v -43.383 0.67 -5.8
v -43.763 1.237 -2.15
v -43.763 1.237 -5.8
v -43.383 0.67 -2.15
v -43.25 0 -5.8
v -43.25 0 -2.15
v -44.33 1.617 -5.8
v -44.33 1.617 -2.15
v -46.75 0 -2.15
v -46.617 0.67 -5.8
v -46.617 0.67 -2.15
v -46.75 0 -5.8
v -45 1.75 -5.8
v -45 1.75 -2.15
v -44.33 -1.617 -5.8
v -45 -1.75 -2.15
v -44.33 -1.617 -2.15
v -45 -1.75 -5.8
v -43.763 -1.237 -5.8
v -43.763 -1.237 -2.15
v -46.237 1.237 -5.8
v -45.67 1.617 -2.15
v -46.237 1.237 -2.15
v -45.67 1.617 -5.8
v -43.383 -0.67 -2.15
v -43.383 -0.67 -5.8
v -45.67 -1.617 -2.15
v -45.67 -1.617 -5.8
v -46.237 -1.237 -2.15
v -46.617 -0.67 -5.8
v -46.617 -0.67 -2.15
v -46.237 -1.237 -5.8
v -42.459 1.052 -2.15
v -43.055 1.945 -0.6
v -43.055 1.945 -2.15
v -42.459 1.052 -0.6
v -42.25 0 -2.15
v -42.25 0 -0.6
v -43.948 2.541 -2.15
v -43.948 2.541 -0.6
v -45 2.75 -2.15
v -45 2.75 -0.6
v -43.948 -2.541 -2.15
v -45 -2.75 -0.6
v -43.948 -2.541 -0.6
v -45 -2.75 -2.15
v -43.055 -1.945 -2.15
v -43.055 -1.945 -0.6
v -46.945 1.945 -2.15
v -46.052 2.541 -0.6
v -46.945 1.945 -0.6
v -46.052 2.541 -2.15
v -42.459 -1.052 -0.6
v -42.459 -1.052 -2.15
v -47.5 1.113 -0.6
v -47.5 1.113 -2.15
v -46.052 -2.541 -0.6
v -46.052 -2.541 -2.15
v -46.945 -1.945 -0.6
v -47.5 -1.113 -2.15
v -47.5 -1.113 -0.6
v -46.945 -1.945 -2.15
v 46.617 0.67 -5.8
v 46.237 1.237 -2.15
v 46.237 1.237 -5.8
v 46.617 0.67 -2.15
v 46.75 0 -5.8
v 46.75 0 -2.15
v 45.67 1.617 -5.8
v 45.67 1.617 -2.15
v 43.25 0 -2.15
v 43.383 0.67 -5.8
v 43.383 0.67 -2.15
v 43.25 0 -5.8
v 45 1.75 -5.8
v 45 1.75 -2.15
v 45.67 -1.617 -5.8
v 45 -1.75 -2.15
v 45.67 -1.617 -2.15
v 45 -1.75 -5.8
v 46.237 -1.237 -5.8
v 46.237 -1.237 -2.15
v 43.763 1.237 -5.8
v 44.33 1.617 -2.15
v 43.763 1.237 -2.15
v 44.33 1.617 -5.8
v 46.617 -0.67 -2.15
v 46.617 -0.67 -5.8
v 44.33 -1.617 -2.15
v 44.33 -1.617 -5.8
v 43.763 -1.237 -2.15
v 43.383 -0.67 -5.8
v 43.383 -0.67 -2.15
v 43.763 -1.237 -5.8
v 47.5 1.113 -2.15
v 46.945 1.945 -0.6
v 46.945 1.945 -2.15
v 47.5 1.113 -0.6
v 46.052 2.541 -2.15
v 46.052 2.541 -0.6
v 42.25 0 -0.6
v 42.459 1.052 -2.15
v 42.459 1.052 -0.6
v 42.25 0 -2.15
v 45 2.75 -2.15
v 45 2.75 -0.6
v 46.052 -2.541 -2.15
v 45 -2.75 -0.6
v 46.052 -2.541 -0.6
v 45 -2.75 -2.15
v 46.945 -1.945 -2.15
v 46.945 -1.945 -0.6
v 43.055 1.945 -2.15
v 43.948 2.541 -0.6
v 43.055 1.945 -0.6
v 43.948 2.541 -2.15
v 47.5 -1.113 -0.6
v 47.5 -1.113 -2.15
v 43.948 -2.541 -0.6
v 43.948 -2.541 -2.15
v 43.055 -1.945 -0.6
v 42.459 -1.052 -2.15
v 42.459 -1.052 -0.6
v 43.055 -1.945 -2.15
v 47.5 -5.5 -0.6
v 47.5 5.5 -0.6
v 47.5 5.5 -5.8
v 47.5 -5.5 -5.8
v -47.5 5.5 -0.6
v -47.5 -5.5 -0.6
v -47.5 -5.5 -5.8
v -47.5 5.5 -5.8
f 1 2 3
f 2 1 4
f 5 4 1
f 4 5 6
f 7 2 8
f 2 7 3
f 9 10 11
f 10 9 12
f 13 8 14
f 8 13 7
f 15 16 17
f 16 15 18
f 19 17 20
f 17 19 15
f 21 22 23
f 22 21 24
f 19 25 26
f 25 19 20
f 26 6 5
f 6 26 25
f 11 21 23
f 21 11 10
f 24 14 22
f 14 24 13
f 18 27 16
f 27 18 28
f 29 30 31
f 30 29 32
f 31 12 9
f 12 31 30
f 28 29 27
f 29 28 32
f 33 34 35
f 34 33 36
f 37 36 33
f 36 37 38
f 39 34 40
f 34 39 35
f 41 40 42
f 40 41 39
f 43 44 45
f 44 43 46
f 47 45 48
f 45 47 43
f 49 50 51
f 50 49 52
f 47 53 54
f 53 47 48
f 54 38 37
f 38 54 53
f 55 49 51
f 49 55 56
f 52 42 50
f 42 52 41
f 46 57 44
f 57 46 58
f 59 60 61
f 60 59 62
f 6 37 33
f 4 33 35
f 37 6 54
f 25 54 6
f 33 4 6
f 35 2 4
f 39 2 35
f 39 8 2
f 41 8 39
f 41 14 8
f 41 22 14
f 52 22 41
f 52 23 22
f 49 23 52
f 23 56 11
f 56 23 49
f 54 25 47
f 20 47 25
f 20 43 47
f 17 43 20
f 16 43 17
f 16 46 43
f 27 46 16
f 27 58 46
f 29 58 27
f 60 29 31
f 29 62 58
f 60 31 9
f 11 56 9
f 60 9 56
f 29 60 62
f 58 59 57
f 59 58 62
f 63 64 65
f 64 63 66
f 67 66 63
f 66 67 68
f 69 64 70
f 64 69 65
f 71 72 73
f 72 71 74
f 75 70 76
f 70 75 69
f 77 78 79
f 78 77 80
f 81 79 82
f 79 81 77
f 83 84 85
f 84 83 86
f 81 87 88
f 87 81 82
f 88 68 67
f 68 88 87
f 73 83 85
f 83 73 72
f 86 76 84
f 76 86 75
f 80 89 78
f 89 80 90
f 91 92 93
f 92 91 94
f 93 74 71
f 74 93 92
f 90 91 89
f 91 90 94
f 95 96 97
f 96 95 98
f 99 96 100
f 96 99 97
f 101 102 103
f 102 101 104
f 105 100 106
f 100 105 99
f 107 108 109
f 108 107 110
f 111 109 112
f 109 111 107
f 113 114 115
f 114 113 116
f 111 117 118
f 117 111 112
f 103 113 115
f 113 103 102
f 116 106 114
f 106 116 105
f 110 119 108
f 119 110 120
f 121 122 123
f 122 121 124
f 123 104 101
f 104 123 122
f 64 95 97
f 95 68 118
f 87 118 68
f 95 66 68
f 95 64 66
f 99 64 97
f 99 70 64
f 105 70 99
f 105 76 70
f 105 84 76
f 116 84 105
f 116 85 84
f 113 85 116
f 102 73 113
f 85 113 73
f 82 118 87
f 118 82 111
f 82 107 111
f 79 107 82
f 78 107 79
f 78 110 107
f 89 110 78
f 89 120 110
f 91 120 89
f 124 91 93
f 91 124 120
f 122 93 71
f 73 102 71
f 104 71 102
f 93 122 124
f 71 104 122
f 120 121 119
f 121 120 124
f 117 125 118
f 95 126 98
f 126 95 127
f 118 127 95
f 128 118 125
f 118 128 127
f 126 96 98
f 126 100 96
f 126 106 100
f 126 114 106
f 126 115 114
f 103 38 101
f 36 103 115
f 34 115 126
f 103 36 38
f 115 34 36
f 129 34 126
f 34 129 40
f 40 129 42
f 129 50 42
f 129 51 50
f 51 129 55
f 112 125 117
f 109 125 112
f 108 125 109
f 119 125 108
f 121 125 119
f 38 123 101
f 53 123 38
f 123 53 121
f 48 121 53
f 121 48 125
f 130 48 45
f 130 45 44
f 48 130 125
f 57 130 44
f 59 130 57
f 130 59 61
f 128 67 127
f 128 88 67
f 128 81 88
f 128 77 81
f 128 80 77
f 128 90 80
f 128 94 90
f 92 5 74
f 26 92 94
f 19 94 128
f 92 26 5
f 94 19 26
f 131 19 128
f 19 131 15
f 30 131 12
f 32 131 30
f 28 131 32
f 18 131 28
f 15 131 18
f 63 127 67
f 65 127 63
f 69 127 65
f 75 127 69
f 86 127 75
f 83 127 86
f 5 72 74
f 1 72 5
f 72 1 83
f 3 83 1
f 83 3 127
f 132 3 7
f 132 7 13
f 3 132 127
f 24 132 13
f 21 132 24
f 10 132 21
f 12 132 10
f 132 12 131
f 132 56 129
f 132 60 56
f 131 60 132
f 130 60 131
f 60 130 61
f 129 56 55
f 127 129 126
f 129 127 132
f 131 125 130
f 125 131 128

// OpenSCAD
// file: ../library/linurs_screw.scad
// Metric screws and nuts 
// urs@linurs.org 2015
// It is targeted for 3D printing applications. 
// To look realistic is not the goal (Example: Nuts do not have a hole)

include <linurs_screw_dim.scad>

// Changes
//2019-02-09 split in two files
//2017-05-19 bug fix hexbolt had wrong diameter
//2017-01-22 bug fix lentgh of hex scre is outer lenght as other screw types
//2017-01-06 added hex screw
//2015-10-12 added screw_cut
//2015-11-29 screw_fix parameter sunk added, and module hex_bolt

// Consistent parameters in this file
// d screw diameter M2_5, M3, ... (enumeration with screw_d)
// t millimeters added to diameters 
//   For the screw, head, nut = 0. 
//   For the piece where the screw, nut, ... passes through = 0.5 so it slides in well

// functions used multiple times to position nuts and heads
function headh_cyl(d)=screw_cyl[d][1];  // height of cyl screw head
function headh_cnt(d)=screw_cyl[d][1];  // height of cnt screw head
function headh(d,type=head_cyl)=(type==head_cyl ? headh_cyl(d) : (type==head_cnt ? headh_cnt(d) : 0 )); // height of screw head 

function nuth(d)=screw_hex[d][2];   // height of hex nut

// head of a cylinder screw
module screw_head_cyl(d=M3, t=0)
{
  screwhd=screw_cyl[d][0]+t; // diameter of cylinder screw head
  cylinder(d=screwhd,h=headh(d=d, type=head_cyl), center=true,$fn=16); // screw head
}

// head of a countersunk screw
module screw_head_cnt(d=M3, t=0)
{
  screwd=screw_d[d]+t; 
  screwhd=screw_cnt[d][0]+t; // diameter of cylinder screw head
  cylinder(d1=screwd,d2=screwhd,h=headh(d=d,type=head_cnt), center=true,$fn=16); // screw head
}

// head of a hex screw
module screw_head_hex(d=M3, t=0)
{
    translate([0,0,-nuth(d)/2])nut(d=d, t=t);
}

// head of all screws
module screw_head(d=M3, type=head_cyl, t=0)
{ 
  if(type==head_cnt){
    screw_head_cnt(d=d, t=t);
  } else {
    if(type==head_cyl){
      screw_head_cyl(d=d, t=t);
    } else {
       if(type==head_hex){
           screw_head_hex(d=d, t=t); 
       } 
    }    
  }
}

// hex bolt 
module hex_bolt(d=M3, h=10, t=0)
{
  nutd=screw_hex[d][1]+t; // outer diameter of hex bolt
  cylinder(r=nutd/2,h=h+t, center=true,$fn=6); // nut
}

// nut 
module nut(d=M3, t=0)
{
  hex_bolt(d=d, h=nuth(d), t=t);    
}

// screw 
// w outer width of the screw = screw length + head 
module screw(w=10, d=M3, type=head_cyl, t=0){
  screwd=screw_d[d]+t;       // screw diameter
  cylinder(d=screwd, h=w, center=true,$fn=16); // screw thread length
  translate([0,0,w/2-headh(d=d,type=type)/2])
  screw_head(d=d,type=type, t=t);
}

// screw fix
// w outer width of the screw = screw length + head 
// sink additional material below to remove 
// raise additional material above to remove
module screw_fix(w=10, d=M3, type=head_cyl, sink=0, raise=0, t=0){
  screw(w=w-sink*2, d=d, type=type, t=t);
  translate([0,0,-(w-sink*2)/2+nuth(d)/2])
    nut(d=d,t=t);
  translate([0,0,-(w-sink+raise)/2])hex_bolt(d=d,h=sink+raise,t=t);    
  if(type==head_cnt){  
    translate([0,0,(w-sink+raise)/2])
    cylinder(d=screw_cnt[d][0]+t,h=sink+raise,center=true,$fn=16);
  }else{ 
    translate([0,0,(w-sink+raise)/2])
    cylinder(d=screw_cyl[d][0]+t,h=sink+raise,center=true,$fn=16);
  }     
}
//screw_fix();
//translate([10,0,0])screw_fix(sink=2,type=head_cnt);
//translate([-10,0,0])screw_fix(raise=2,type=head_cnt);

// screw cut
// material to be extracted from object to slide in a counter sunk screw for fixation
// w height of the cut out
// i depth of the screw
module screw_cut(d=M3,w=20,i=10,t=0,fn=32){
    hsh=screw_cnt[d][1];
    ws=screw_cnt[d][0]+t;
    ds=screw_d[d]+t;
    
    translate([i/2,0,-(w-hsh)/2])
      cube([i,ws,hsh],center=true);
    
    translate([0,0,-(w-hsh)/2])
      cylinder(d=ws,h=hsh,center=true,$fn=32);
    
    translate([0,0,-(w-hsh)/2+hsh])
        cylinder(d2=ds, d1=ws, h=hsh,center=true,$fn=fn);
    
    cylinder(h=w, d=ds, center=true, $fn=fn);   
    
    translate([i/2,0,0]) 
        cube([i,ds,w],center=true);
    
    for(y=[-1,1]){
        translate([i/2,y*ds/2,-w/2+hsh])
            rotate([45,0,0])
            cube([i,sqrt(2)*(ws-ds)/2,sqrt(2)*(ws-ds)/2],center=true);
    }
}
//screw_cut();

// nut cut
// material to be extracted from object to slide in a nut for fixation
// w height of the cylinder
// i lenght of the inlet
module nut_cut(w=10, wi=0, d=M3, i=10, t=0, raise=0, type=head_cyl){ 
  nut(d,t);
  translate([i/2,0,0])
    cube([i,screw_hex[d][0]+t,nuth(d)+t],center=true);
  translate([0,0,-wi])
      if(type==head_cnt){    
          screw(w=w, d=d, type=type, t=t); 
        translate([0,0,(w+raise)/2-0.01])
          cylinder(d=screw_cnt[d][0]+t,h=raise,center=true,$fn=16);
      }else{ 
          screw(w=w, d=d, type=type, t=t);   
        translate([0,0,(w+raise)/2-0.01])
          cylinder(d=screw_cyl[d][0]+t,h=raise,center=true,$fn=16);
      }       
}
//
nut_cut(raise=2,type=head_cnt,i=14,w=20,wi=2, t=1);

// present the library
show=0;

if(show==1){
    grid=20;
    
    for (j=[0:10]){
        for (i=[0:3])
           translate([j*grid,i*grid,0]){  
           
    // elements           
           if(j==0){
             screw_fix(w=(i+2)*5,d=i, type=head_cyl, t=0);
           }
       
           if(j==1){
             nut(d=i,t=0);
           } 
       
           if(j==2){   
              screw(d=i,t=0);
           } 
           
           if(j==3){   
              screw(d=i,t=0,type=head_cnt);
           } 
           
           if(j==4){   
              screw(d=i,t=0,type=head_hex);
           } 
           
           if(j==5){   
              hex_bolt(d=i,t=0);
           } 
           
       }
    }   
     
    for (j=[0:2]){
        for (i=[0:3])
           translate([j*grid,-(i+1)*grid,0]){  
             difference(){
                cube([3*screw_d[i],3*screw_d[i],(i+2)*5-0.1],center=true);    
    
                if(j==0){
                  screw_fix(w=(i+2)*5,d=i,type=head_cnt, t=0.5);
                }   
                
                if(j==1){
                  nut_cut(d=i,w=(i+2)*5);
                }
                if(j==2){
                  screw_cut(d=1,w=(i+2)*5);
                }
            
             }
           }  
        
    }
}
   
// file: ../library/linurs_screw_dim.scad
// Metric screws and nuts 
// urs@linurs.org 2015

// contains dimensions of linurs_screw and can be included in other 
// OpenScad files 


// Consistent parameters in this file
// d screw diameter M2_5, M3, ... (enumeration with screw_d)
// t millimeters added to diameters 
//   For the screw, head, nut = 0. 
//   For the piece where the screw, nut, ... passes through = 0.5 so it slides in well

// enumerations of metric threads
M2_5=0;
M3=1;
M4=2;
M5=3;

// enumerations screw head type
head_cyl=0; // cylinder
head_cnt=1; // countrsunk
head_no=2;  // no head at all
head_hex=3;  // no head at all

// screw diameters
screw_d=[
2.5, // M2.5
3.0, // M3
4.0, // M4
5.0  // M5
];

// sizes for hex nuts
screw_hex=[
//   s,   e,   h
 [ 5.0, 5.8, 1.7], // M2.5
 [ 5.5, 6.4, 2.0], // M3
 [ 7.0, 8.1, 2.8], // M4
 [ 8.0, 9.2, 3.5]  // M5
];

// sizes for cylinder screw heads
screw_cyl=[
//   d,   h
 [ 4.5, 1.6], // M2.5
 [ 5.5, 2.0], // M3
 [ 7.0, 2.6], // M4
 [ 8.5, 3.3]  // M5
];

// sizes for countersunk screw heads
screw_cnt=[
//   d,   h
 [ 4.7, 1.50], // M2.5
 [ 5.6, 1.65], // M3
 [ 7.4, 2.20], // M4
 [ 9.2, 2.50]  // M5
];
// file: motherboard_dim.scad
// motherboard pcb dimensions
motherboard_w=100;   // pcb width
motherboard_t=1.6;   // pcb thickness
motherboard_pass=0.5;// gap to fit screws 
step=25.4;           // distance between modules

// connector dimensions
motherboard_con_head_w=85;  // width of the connector head
motherboard_con_head_d=8.5; // depth of the connector head
motherboard_con_w=95;       // largest width of the connector
motherboard_con_h=11.6;     // largest height of the connector
motherboard_con_t=11;       // largest depth of the connector
motherboard_con_d_w=90;     // distance between mounting holes
motherboard_con_d=2.8;      // diameter of mounting holes
motherboard_con_out=5.2;    // height produced by the connector when pulgged in 

// pcb module connector dimension
pcbmodule_con_out=13-(5.3+2.8-2.54);  // distance connector sticks out of pcb

// offset
motherboard_z_offset= -(pcbmodule_con_out+motherboard_con_out+motherboard_t); // z offset motherboard built in
// main file
// motherboard
// Connector to be mounted on the motherboard pcb
// This module is not intended to be 3D printed
// set type to 1 to get dummy conector

include <motherboard_dim.scad>
include <../library/linurs_screw_dim.scad>
use <../library/linurs_screw.scad>

module motherboard_con(type=0){
  color("LightGrey")
  difference(){
    union(){
      if(type==0){  
        cube([motherboard_con_head_w,
              motherboard_con_head_d,
              motherboard_con_h],
              center=true);  // upper body of the connector down to motherboard level
      }    
      translate([0,0,-(motherboard_con_h-motherboard_con_out)/2])
        cube([motherboard_con_w,
              motherboard_con_t,
              motherboard_con_out],
              center=true); // lower body of the connector laying on mother board
    }
    for(i=[-1,1]){ // mounting holes
      translate([i*motherboard_con_d_w/2,
                 0,
                 -(motherboard_con_h-motherboard_con_out)/2])
      screw(w=motherboard_con_out+0.1, d=M2_5, type=head_cyl, t=1);
    }
  }
}

//motherboard_con();
//
motherboard_con(type=1);
